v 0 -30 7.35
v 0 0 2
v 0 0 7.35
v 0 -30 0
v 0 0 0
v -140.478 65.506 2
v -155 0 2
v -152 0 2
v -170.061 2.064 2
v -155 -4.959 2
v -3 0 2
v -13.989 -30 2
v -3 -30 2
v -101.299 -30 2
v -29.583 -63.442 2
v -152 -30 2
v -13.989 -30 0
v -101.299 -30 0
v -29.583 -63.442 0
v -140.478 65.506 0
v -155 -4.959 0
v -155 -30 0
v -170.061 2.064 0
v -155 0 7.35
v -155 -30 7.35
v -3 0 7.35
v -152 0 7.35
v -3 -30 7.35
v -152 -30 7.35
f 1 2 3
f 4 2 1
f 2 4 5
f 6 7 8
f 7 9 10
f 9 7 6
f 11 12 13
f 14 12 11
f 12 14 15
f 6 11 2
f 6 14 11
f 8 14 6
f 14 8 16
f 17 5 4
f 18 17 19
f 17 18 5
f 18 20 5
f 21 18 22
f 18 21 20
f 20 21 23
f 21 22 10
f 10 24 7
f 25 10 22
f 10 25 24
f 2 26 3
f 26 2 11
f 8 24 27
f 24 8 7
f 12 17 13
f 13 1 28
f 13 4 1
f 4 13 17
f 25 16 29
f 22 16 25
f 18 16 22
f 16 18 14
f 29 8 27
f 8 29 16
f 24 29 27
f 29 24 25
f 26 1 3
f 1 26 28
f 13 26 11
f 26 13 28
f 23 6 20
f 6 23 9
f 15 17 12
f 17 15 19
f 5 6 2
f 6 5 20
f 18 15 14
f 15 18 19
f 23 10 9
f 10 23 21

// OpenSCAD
FlashingWidth = 155;
FlashingLength = 30;
FlashingWallHeight = 6.35;

translate([-FlashingWidth,-FlashingLength,0])
{
    cube([FlashingWidth,FlashingLength,2]);
    cube([3,FlashingLength,FlashingWallHeight+1]);
    translate([FlashingWidth-3,0,0])
    cube([3,FlashingLength,FlashingWallHeight+1]);
}

//translate([-10,-10,0])
rotate(155)
//translate([-10,-10,0])
cube([FlashingWidth,70,2]);
